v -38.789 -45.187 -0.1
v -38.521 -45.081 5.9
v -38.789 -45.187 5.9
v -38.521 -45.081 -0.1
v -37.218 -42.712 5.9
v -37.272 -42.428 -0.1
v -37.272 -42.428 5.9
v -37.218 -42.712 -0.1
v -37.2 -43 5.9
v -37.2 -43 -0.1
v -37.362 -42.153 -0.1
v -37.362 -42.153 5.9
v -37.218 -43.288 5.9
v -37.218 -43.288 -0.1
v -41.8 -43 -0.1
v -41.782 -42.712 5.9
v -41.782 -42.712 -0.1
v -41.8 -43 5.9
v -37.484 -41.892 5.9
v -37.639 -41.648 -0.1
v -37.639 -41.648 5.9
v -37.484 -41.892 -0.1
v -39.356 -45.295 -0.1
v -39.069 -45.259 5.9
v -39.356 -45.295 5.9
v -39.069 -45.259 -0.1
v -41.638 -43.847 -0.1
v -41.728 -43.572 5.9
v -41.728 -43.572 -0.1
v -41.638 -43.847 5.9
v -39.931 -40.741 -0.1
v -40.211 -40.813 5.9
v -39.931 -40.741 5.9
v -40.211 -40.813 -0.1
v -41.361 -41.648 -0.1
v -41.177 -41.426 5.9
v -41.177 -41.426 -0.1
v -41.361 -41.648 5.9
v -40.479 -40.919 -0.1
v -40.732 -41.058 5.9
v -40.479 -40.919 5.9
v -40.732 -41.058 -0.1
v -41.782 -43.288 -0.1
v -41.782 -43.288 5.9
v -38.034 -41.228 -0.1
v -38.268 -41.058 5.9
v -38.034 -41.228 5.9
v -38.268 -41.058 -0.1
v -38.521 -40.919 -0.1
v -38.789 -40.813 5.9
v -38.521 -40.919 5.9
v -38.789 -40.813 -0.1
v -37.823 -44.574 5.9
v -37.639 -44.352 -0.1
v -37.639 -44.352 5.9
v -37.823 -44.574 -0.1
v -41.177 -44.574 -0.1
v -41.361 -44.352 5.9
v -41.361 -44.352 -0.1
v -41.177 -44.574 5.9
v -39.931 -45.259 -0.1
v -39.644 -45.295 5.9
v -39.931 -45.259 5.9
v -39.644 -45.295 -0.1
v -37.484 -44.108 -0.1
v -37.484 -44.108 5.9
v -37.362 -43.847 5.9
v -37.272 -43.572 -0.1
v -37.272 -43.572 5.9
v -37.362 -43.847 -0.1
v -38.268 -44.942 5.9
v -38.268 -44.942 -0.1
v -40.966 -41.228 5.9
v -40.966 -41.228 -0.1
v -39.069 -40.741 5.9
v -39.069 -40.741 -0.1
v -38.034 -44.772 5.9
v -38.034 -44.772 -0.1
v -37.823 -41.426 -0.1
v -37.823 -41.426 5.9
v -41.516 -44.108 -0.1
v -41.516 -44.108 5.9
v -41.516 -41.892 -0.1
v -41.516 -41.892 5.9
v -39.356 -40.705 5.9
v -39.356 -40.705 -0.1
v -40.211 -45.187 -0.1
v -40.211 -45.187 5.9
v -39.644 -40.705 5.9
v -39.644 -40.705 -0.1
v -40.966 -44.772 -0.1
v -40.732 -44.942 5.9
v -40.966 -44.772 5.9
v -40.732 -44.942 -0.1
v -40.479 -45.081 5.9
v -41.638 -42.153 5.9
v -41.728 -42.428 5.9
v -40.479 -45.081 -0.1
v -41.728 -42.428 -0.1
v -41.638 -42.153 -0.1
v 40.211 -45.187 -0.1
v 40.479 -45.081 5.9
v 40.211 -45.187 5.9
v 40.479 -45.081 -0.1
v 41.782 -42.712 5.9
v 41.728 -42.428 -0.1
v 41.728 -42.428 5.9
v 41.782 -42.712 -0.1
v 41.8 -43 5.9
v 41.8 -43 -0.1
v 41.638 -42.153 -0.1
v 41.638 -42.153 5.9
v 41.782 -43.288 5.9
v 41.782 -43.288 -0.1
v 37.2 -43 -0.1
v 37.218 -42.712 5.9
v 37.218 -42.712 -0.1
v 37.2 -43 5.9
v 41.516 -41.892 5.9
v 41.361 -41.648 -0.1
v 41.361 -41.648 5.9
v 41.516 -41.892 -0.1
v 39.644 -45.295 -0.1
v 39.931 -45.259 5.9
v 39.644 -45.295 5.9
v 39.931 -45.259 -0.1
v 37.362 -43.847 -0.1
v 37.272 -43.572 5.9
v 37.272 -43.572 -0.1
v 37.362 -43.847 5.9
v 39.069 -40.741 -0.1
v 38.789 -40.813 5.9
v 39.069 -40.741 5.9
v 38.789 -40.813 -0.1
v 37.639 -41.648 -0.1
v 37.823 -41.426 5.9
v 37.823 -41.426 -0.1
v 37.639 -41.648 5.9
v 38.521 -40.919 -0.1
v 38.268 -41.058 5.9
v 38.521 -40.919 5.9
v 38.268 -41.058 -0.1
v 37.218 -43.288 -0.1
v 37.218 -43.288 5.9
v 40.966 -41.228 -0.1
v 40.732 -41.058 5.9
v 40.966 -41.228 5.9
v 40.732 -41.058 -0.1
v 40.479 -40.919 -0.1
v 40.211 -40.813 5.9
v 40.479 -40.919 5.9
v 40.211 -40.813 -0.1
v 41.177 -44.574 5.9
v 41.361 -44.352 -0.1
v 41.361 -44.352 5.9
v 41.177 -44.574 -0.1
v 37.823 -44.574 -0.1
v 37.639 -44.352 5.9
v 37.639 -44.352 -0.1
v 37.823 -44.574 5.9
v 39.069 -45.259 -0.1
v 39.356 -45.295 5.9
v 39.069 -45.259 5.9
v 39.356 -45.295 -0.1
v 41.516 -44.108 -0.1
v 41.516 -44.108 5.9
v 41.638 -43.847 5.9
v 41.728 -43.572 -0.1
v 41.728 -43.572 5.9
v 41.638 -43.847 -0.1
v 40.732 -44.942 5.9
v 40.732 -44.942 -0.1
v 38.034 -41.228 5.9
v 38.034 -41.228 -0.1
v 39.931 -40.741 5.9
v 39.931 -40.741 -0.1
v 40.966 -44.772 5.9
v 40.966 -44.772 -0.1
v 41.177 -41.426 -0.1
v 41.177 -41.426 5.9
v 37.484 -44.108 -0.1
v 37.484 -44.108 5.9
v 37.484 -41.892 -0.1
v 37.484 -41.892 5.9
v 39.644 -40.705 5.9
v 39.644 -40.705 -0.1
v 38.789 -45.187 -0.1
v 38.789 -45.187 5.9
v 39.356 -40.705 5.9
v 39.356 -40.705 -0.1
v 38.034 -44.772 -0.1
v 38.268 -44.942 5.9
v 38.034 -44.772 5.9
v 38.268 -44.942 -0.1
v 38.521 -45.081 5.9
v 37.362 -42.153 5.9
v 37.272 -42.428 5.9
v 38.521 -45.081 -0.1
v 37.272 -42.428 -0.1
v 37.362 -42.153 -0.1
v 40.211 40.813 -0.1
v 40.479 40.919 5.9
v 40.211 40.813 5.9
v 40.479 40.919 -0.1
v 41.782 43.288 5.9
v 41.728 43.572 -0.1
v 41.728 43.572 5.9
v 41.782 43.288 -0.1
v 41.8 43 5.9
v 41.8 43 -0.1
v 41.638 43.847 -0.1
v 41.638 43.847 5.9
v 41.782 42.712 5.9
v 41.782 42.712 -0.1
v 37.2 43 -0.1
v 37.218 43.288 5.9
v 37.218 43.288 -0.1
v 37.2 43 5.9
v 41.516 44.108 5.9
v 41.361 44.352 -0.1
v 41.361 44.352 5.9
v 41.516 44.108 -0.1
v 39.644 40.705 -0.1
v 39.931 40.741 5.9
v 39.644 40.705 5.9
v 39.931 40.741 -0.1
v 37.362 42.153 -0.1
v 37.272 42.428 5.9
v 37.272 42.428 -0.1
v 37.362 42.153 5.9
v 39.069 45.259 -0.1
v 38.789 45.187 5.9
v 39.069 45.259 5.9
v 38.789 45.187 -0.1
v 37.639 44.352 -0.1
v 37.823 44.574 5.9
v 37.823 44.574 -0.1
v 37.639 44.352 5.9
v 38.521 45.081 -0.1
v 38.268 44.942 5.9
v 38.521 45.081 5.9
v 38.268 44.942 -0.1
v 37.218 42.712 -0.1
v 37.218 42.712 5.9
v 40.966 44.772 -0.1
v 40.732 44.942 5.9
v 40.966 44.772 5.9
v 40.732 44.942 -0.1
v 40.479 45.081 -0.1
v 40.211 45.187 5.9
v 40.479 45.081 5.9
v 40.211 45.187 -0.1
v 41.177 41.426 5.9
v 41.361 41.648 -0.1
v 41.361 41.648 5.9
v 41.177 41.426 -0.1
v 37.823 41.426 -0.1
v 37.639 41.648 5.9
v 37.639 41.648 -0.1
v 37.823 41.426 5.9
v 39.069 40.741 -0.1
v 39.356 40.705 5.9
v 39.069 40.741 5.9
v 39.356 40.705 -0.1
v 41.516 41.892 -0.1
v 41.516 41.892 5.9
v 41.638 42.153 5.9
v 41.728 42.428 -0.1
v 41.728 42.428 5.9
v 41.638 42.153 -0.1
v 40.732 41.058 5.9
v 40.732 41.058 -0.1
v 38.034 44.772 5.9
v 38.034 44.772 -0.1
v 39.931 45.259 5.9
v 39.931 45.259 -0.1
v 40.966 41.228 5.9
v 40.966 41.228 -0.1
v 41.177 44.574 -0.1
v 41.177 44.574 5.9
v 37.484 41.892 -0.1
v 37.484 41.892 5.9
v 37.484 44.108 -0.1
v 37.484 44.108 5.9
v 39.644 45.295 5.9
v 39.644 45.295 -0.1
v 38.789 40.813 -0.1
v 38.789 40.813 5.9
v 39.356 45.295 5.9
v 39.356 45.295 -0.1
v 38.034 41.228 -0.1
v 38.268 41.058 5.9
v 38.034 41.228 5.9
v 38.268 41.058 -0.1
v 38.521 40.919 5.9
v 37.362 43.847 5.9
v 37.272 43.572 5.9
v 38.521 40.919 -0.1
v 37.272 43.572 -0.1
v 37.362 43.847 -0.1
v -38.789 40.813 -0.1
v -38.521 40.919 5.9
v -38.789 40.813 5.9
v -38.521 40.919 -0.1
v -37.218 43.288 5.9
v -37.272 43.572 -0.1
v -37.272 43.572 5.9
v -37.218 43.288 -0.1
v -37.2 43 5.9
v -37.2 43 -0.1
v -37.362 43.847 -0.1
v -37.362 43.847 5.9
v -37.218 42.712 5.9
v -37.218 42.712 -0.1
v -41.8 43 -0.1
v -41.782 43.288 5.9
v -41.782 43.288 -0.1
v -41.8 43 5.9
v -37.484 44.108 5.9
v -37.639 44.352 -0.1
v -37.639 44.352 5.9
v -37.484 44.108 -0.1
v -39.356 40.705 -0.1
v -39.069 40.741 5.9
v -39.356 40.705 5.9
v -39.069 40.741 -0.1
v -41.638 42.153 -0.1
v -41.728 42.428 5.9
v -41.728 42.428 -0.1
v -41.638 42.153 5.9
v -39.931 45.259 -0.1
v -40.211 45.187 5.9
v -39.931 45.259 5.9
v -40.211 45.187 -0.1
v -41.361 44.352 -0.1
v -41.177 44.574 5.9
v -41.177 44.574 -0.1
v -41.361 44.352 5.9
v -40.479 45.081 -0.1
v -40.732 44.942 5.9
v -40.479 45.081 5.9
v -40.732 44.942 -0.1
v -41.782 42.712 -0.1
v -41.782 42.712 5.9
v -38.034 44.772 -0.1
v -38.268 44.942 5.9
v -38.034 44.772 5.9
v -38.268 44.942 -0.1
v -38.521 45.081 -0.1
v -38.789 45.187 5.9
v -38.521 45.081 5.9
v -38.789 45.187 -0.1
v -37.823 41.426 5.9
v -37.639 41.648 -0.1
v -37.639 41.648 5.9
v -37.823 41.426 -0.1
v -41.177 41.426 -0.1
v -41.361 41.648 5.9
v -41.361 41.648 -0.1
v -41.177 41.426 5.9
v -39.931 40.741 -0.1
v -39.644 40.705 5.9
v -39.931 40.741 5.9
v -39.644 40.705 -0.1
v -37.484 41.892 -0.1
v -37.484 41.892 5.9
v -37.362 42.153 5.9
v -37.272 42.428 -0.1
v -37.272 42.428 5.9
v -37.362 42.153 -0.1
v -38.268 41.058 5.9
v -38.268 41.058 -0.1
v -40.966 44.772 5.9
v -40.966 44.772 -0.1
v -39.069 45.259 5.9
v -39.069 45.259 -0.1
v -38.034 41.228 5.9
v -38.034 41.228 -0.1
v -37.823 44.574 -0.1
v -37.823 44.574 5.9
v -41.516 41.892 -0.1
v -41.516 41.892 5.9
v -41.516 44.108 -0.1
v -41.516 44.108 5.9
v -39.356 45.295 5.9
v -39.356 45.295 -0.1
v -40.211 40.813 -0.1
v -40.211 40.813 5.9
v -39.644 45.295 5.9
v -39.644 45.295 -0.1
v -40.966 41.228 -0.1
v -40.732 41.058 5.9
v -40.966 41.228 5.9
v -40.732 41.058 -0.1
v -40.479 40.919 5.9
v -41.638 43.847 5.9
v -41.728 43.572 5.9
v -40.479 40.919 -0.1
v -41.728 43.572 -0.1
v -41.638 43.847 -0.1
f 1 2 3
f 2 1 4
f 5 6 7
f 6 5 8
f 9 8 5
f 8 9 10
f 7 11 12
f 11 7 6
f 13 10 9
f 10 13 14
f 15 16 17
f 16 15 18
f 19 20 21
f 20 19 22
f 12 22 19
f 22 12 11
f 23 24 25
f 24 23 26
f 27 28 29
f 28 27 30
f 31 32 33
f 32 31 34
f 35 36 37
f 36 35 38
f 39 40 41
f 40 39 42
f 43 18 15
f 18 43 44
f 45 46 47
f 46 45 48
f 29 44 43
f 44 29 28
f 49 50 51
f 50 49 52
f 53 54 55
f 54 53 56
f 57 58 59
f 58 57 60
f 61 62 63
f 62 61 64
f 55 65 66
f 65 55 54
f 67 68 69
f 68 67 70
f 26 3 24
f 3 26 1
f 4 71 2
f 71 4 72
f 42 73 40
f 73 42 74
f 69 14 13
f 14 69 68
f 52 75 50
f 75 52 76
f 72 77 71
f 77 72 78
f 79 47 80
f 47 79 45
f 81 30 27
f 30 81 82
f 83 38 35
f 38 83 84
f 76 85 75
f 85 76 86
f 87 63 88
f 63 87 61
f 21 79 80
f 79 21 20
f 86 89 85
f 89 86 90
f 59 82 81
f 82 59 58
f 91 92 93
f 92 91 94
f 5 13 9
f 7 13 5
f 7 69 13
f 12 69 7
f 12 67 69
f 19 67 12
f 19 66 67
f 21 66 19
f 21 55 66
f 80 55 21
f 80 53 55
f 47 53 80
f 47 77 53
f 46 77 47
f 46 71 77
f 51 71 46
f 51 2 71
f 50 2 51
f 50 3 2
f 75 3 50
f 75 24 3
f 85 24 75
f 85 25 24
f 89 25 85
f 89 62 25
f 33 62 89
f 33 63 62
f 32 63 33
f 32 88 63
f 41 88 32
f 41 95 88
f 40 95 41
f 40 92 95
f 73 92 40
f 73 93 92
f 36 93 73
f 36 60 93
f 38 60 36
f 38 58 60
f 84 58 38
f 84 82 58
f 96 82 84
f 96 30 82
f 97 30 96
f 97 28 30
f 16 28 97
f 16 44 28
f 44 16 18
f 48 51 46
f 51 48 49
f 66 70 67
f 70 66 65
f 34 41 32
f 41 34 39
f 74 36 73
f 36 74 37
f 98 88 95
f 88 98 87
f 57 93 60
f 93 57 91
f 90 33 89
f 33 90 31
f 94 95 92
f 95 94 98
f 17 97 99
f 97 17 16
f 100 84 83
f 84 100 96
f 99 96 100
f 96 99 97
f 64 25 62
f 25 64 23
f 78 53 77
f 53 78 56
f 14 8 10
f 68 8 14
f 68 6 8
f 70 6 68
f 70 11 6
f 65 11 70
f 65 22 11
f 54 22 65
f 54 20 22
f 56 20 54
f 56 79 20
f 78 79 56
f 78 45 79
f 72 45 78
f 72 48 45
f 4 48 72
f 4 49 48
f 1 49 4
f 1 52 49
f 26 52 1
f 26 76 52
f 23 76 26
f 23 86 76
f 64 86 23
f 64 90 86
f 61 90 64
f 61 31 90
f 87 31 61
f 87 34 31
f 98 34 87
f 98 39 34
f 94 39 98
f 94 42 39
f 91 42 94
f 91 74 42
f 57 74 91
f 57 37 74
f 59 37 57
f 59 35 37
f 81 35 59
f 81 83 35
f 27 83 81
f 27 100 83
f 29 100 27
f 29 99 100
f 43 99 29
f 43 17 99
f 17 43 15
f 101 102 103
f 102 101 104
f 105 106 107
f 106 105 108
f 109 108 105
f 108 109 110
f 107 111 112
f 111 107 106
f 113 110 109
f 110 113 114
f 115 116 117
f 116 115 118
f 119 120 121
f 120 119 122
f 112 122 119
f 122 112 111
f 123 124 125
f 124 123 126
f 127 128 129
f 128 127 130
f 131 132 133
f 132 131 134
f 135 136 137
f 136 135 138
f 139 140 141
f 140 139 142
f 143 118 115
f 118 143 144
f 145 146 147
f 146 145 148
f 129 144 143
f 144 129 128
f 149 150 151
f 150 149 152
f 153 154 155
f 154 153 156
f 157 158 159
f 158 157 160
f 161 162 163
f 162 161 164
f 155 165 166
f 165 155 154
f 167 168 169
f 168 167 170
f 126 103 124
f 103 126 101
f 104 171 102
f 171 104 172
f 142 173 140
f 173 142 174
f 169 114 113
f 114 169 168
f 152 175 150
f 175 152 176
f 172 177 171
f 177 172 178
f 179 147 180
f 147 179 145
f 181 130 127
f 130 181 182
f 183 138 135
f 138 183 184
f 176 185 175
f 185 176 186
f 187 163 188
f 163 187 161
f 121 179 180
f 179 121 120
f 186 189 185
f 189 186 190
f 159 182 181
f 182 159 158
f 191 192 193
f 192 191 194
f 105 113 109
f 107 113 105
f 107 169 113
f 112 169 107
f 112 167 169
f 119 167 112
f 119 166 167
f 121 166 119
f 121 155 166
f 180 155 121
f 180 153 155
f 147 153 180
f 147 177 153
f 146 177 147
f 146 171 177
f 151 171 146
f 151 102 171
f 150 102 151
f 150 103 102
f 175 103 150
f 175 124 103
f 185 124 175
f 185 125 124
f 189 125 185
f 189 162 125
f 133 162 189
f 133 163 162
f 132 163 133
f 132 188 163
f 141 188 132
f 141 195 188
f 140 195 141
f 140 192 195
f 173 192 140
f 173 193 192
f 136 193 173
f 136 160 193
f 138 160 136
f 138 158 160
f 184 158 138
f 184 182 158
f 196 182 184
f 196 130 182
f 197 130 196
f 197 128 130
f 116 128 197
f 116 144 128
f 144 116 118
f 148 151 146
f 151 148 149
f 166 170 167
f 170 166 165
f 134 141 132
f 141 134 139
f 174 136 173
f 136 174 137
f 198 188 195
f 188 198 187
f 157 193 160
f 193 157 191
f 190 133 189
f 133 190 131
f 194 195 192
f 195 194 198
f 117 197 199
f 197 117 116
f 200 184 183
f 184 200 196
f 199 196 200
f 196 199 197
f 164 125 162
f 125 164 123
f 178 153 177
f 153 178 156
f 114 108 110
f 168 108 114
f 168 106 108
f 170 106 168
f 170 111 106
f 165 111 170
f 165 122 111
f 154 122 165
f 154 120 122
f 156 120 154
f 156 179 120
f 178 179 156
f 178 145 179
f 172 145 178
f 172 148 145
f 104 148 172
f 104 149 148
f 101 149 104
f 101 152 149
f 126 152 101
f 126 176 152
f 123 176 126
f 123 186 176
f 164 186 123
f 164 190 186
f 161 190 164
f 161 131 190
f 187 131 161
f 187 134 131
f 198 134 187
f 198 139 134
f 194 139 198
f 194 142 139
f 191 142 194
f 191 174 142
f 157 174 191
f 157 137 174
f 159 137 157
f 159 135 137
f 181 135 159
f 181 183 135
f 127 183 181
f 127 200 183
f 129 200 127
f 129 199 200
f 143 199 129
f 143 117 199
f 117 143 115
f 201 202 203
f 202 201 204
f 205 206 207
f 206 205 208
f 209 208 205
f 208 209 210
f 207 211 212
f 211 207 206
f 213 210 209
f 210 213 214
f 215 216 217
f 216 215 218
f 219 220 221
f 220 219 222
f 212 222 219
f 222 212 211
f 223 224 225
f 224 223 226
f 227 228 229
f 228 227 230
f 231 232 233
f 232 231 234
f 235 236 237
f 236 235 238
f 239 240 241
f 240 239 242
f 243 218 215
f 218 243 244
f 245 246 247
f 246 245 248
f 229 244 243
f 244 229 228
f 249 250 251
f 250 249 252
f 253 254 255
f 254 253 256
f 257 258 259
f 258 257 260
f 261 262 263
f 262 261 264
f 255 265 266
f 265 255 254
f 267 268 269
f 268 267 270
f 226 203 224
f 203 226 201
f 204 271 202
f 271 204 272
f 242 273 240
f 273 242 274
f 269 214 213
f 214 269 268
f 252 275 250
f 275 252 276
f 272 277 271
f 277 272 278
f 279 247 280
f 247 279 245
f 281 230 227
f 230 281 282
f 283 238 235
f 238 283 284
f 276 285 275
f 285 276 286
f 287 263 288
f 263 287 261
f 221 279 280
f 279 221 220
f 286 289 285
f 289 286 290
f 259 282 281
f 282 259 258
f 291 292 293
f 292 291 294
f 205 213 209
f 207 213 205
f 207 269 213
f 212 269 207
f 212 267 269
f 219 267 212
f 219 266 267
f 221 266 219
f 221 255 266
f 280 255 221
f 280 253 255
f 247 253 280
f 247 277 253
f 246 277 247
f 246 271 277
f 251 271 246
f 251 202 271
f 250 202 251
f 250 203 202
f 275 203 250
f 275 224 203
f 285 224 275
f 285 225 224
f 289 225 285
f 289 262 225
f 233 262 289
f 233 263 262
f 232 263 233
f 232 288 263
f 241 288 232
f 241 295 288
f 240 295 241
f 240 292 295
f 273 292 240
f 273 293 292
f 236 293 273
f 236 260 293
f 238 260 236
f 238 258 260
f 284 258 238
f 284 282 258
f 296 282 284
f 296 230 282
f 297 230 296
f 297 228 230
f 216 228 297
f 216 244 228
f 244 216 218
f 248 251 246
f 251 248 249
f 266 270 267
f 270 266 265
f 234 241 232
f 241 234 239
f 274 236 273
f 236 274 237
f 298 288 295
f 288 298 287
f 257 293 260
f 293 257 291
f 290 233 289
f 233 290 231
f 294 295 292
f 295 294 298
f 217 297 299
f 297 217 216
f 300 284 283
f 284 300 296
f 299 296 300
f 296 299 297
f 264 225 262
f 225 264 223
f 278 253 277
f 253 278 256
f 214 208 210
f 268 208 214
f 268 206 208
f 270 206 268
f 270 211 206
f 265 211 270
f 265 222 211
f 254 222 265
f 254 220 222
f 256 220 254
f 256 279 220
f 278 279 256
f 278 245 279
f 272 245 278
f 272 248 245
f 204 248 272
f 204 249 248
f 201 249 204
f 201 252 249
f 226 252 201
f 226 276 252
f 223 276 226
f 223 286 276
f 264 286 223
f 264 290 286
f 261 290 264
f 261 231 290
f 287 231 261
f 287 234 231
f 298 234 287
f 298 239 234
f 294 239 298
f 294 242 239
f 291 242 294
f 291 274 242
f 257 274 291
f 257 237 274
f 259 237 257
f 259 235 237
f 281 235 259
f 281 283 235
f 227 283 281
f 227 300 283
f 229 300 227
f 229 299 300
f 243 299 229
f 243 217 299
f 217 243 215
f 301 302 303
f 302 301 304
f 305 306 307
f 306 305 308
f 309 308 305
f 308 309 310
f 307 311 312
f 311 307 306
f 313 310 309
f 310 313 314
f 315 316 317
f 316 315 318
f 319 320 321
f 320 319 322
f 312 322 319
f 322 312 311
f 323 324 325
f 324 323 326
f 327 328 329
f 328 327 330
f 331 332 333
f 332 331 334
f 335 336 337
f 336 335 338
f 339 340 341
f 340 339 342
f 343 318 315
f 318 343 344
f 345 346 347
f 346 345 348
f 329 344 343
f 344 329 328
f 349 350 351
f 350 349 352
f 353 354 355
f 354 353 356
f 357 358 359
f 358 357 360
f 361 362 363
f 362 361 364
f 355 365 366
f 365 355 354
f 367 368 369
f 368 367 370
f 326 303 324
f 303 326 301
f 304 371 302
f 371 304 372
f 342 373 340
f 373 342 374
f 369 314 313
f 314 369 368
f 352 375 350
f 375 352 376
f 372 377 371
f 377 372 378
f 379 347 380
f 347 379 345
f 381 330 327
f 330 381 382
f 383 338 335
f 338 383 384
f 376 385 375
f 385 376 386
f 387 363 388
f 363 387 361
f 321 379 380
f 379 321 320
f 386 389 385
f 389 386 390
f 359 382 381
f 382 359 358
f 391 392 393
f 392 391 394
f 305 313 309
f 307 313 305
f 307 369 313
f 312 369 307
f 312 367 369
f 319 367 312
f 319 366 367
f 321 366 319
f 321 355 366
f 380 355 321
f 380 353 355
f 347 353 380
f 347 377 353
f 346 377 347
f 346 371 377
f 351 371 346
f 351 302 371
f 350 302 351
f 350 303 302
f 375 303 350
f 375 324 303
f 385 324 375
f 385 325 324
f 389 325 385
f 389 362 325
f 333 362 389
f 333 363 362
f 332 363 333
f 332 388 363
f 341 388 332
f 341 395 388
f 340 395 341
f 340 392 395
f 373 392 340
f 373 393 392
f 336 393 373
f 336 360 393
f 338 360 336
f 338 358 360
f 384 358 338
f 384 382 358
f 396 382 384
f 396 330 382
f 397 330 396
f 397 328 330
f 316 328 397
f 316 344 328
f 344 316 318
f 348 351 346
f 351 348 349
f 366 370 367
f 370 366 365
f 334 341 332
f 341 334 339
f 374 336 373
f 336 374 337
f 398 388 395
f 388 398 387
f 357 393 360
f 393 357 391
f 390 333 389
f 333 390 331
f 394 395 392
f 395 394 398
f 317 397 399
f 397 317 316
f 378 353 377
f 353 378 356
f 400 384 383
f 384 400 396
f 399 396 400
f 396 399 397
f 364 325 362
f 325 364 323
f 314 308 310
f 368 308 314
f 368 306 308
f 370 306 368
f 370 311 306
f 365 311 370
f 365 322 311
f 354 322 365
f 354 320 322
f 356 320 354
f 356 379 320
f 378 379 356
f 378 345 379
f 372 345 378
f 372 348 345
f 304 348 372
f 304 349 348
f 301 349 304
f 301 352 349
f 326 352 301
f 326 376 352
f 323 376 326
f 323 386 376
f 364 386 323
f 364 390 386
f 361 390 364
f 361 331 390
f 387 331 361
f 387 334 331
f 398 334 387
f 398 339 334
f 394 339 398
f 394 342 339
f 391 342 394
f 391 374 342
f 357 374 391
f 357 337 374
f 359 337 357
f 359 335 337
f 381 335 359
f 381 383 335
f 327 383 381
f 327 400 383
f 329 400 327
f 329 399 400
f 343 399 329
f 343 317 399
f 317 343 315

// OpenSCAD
// file: ../robot_settings.scad
main_box_x = 95; // 96
main_box_y = 102;
main_box_z = 74; // 74.5
wall_thickness = 2;

rail_gap = 2;
rail_inset = 7;

rail_thickness = 7;
rail_length = 250;
rail_width = 250;

raspberry_pi_screw_seperation_y = 57;
raspberry_pi_screw_seperation_z = 48;
raspberry_pi_peg_h = 5;

battery_box_peg_h = 6;
battery_box_peg_d = 8;
battery_box_peg_cutout = 5;

gears_module = 1;
pinion_gear_teeth = 32;
pinion_gear_width = 5;
pinion_gear_bore = 8;

gears_setback_distance = 25;
gear_post_height = 2 * pinion_gear_width + rail_thickness + 8 ;

steering_motor_mount_x = 45;
steering_motor_mount_y = 36;
steering_motor_mount_z = 18;
steering_motor_mount_setback_distance = gears_setback_distance + 16;

dc_motor_drivertype = "Teyleten"; // Teyleten
isAdafruit = (dc_motor_drivertype == "Adafruit");

drv8871_x = isAdafruit ? 20.3 : 21.6;
drv8871_y = isAdafruit ?  24 : 25;

drv8871_z = 2;
drv8871_screw_d = 2.5;
drv8871_solder_points_z = 2;

drv8871mount_edge_x = 1.5;
drv8871mount_edge_wall = 3;
drv8871mount_z = 5;
drv8871mount_x = drv8871_x +  drv8871mount_edge_wall - 2* drv8871mount_edge_x;
drv8871mount_y = 19;

drv8871_screw_distance = 15.64;
drv8871_solder_points_d = 1.66;
drv8871_solder_offset_y = 4.4;
drv8871_solder_inner_points_distance = 5;
drv8871_solder_outer_points_distance = 12;

dc_motor_housing_minus_encoder_z = 48;
dc_motor_encoder_z = 9.33;
dc_motor_encoder_wheel_d = 13.4;
dc_motor_encoder_wheel_thickness = 5;
dc_motor_encoder_wheel_gap = 3;
dc_motor_encoder_circuit_thickness = 2;
dc_motor_cutout_d = 24.8;
dc_motor_cutout_z = 19.5;

dc_motor_screw_head_z = 2;
dc_motor_screw_head_d = 5.6;
dc_motor_screw_d = 3.2;
dc_motor_screw_offset = 8.5;

dc_motor_axle_ring_z = 3;
dc_motor_axle_ring_d = 7.2;
dc_motor_axle_cutout_d = 4.2;
dc_motor_axle_cutout_z = 10;
dc_motor_axle_notch_cutout = 0.4;
dc_motor_axle_notch_cutout_z = 6;

pdmount_x = 20;
pdmount_y = 30;
pdmount_z = 2;
pdmount_edge_x = 1.5;
pdmount_edge_wall = 3;

steering_shaft_z = 45;
steering_shaft_d = 7;
steering_shaft_motor_fitting_d = 9;
coupler_length = 24.6;
coupler_diameter = 14;
coupler_screw_d = 4;
coupler_screw_z_offset = 5;
coupler_gear_side_insert = 12.6;
steering_shaft_with_coupler_z = steering_shaft_z - coupler_gear_side_insert;

lidar_mount_y = 110;
lidar_mount_x = 65 + 20;
lidar_narrow_screws = 40;
lidar_wide_screws = 56;
lidar_front_to_back_screws = 70;
lidar_screw_d = 3;
lidar_circuitboard_x = 20;
lidar_circuitboard_y = 35;
lidar_circuitboard_z = 1.2;
lidar_cord_length = 29;

ball_bearing_height = 7;
ball_bearing_outer_diameter = 22;
ball_bearing_inner_diameter = 8;

M4_diameter = 5.1;
M3_diameter = 2.9;
M3_length = 35;
M3_cap_length= 3;
M3_cap_diameter = 5.44;

suspension_spring_outer_diameter = 8;
suspension_spring_inner_diameter = 5.3;

armature_holder_height = 20;
armature_holder_thickness = 8;
pull_bar_peg_r = 3.2;
apparatus_locking_peg_d = 4;

rack_module = 1;
rack_length = main_box_x;
rack_height = 5;
rack_width = 10;
rack_teeth = 30;
rack_bore = 3;

pull_bar_length = rail_width / 2 - rack_length + 1;

// tire hardware
axle_length = 24 + ball_bearing_height; 
axle_reciever_inner_diameter = 8.2;
axle_reciever_outer_diameter = 12;
axle_reciever_length = 18.8;
axle_notch_length = 15;
axle_notch_cutout = 2.4;

// power distribution bar
power_bar_cutout_x = 96;
power_bar_y = 19.1;
power_bar_z = 1.5;
power_bar_screw_distance = 91.4;
power_bar_screw_d = 2.8;
power_bar_standoff_z = 5;
power_bar_standoff_d = 6.83;

pico_expander_width = 63;
pico_expander_height = 57;
pico_screw_hole_offset = 3;
pico_screw_hole_d = 2.5;

usbhub_thickness = 11.7;
usbhub_depth = 37.5;
usbhub_width = 86.7;
usbhub_end_port_width = 14.8;
usbhub_end_port_height = 12;
usbhub_front_face_safe_zone_left = 15;
usbhub_front_face_safe_zone_right = 14.8;

switch_w = 16;
switch_cutout_d = 12.2;
switch_bump_h = 2;
switch_bump_l = 18.2;
// main file
   include <../robot_settings.scad>
   $fn = 50;
 
 module battery_box_peg_mounts(
  show_mounts = false,
  show_points = true) 
  {

if (show_mounts) 
{
  // temporary base platform
  //translate([0, 0, battery_box_peg_d / 2 + 3])
  //cube([main_box_x, main_box_y, 2]);
  
    translate([-main_box_x / 2, -main_box_y / 2, battery_box_peg_d / 2 + .1])
    {
     color("green")
    translate([battery_box_peg_d, battery_box_peg_d, 0])
      difference() {
        cylinder(h = battery_box_peg_h, d = battery_box_peg_d, center = true);
       translate([0, 0, -.1])
        cylinder(h = battery_box_peg_h + 1, d = battery_box_peg_cutout, center = true); 
      }

  color("red")
    translate([-battery_box_peg_d + main_box_x, battery_box_peg_d, 0])
      difference() {
        cylinder(h = battery_box_peg_h, d = battery_box_peg_d, center = true);
       translate([0, 0, -.1])
        cylinder(h = battery_box_peg_h + 1, d = battery_box_peg_cutout, center = true); 
      }

  color("white")
    translate([-battery_box_peg_d + main_box_x, -battery_box_peg_d + main_box_y, 0])
      difference() {
        cylinder(h = battery_box_peg_h, d = battery_box_peg_d, center = true);
       translate([0, 0, -.1])
        cylinder(h = battery_box_peg_h + 1, d = battery_box_peg_cutout, center = true); 
      }
     
    translate([battery_box_peg_d, -battery_box_peg_d + main_box_y, 0])
      difference() {
        cylinder(h = battery_box_peg_h, d = battery_box_peg_d, center = true);
       translate([0, 0, -.1])
        cylinder(h = battery_box_peg_h + 1, d = battery_box_peg_cutout, center = true); 
      } 
    }
  }
    if (show_points) {
      // temporary base platform
//     translate([-main_box_x / 2, -main_box_y / 2, 0])
//     cube([main_box_x, main_box_y, 2]);
      
      cutout_offset = .4;
      
      // battery box attachment points
       translate([-main_box_x / 2, -main_box_y / 2,  - .1]) 
      {
        translate([battery_box_peg_d, battery_box_peg_d, 0])
        cylinder(h = battery_box_peg_h, d = battery_box_peg_cutout - cutout_offset);

        translate([-battery_box_peg_d + main_box_x, battery_box_peg_d, 0])
        cylinder(h = battery_box_peg_h, d = battery_box_peg_cutout - cutout_offset);

        translate([-battery_box_peg_d + main_box_x, -battery_box_peg_d + main_box_y, 0])
        cylinder(h = battery_box_peg_h, d = battery_box_peg_cutout - cutout_offset);

        translate([battery_box_peg_d, -battery_box_peg_d + main_box_y, 0])
        cylinder(h = battery_box_peg_h, d = battery_box_peg_cutout - cutout_offset);
       }
   }

}
battery_box_peg_mounts();
